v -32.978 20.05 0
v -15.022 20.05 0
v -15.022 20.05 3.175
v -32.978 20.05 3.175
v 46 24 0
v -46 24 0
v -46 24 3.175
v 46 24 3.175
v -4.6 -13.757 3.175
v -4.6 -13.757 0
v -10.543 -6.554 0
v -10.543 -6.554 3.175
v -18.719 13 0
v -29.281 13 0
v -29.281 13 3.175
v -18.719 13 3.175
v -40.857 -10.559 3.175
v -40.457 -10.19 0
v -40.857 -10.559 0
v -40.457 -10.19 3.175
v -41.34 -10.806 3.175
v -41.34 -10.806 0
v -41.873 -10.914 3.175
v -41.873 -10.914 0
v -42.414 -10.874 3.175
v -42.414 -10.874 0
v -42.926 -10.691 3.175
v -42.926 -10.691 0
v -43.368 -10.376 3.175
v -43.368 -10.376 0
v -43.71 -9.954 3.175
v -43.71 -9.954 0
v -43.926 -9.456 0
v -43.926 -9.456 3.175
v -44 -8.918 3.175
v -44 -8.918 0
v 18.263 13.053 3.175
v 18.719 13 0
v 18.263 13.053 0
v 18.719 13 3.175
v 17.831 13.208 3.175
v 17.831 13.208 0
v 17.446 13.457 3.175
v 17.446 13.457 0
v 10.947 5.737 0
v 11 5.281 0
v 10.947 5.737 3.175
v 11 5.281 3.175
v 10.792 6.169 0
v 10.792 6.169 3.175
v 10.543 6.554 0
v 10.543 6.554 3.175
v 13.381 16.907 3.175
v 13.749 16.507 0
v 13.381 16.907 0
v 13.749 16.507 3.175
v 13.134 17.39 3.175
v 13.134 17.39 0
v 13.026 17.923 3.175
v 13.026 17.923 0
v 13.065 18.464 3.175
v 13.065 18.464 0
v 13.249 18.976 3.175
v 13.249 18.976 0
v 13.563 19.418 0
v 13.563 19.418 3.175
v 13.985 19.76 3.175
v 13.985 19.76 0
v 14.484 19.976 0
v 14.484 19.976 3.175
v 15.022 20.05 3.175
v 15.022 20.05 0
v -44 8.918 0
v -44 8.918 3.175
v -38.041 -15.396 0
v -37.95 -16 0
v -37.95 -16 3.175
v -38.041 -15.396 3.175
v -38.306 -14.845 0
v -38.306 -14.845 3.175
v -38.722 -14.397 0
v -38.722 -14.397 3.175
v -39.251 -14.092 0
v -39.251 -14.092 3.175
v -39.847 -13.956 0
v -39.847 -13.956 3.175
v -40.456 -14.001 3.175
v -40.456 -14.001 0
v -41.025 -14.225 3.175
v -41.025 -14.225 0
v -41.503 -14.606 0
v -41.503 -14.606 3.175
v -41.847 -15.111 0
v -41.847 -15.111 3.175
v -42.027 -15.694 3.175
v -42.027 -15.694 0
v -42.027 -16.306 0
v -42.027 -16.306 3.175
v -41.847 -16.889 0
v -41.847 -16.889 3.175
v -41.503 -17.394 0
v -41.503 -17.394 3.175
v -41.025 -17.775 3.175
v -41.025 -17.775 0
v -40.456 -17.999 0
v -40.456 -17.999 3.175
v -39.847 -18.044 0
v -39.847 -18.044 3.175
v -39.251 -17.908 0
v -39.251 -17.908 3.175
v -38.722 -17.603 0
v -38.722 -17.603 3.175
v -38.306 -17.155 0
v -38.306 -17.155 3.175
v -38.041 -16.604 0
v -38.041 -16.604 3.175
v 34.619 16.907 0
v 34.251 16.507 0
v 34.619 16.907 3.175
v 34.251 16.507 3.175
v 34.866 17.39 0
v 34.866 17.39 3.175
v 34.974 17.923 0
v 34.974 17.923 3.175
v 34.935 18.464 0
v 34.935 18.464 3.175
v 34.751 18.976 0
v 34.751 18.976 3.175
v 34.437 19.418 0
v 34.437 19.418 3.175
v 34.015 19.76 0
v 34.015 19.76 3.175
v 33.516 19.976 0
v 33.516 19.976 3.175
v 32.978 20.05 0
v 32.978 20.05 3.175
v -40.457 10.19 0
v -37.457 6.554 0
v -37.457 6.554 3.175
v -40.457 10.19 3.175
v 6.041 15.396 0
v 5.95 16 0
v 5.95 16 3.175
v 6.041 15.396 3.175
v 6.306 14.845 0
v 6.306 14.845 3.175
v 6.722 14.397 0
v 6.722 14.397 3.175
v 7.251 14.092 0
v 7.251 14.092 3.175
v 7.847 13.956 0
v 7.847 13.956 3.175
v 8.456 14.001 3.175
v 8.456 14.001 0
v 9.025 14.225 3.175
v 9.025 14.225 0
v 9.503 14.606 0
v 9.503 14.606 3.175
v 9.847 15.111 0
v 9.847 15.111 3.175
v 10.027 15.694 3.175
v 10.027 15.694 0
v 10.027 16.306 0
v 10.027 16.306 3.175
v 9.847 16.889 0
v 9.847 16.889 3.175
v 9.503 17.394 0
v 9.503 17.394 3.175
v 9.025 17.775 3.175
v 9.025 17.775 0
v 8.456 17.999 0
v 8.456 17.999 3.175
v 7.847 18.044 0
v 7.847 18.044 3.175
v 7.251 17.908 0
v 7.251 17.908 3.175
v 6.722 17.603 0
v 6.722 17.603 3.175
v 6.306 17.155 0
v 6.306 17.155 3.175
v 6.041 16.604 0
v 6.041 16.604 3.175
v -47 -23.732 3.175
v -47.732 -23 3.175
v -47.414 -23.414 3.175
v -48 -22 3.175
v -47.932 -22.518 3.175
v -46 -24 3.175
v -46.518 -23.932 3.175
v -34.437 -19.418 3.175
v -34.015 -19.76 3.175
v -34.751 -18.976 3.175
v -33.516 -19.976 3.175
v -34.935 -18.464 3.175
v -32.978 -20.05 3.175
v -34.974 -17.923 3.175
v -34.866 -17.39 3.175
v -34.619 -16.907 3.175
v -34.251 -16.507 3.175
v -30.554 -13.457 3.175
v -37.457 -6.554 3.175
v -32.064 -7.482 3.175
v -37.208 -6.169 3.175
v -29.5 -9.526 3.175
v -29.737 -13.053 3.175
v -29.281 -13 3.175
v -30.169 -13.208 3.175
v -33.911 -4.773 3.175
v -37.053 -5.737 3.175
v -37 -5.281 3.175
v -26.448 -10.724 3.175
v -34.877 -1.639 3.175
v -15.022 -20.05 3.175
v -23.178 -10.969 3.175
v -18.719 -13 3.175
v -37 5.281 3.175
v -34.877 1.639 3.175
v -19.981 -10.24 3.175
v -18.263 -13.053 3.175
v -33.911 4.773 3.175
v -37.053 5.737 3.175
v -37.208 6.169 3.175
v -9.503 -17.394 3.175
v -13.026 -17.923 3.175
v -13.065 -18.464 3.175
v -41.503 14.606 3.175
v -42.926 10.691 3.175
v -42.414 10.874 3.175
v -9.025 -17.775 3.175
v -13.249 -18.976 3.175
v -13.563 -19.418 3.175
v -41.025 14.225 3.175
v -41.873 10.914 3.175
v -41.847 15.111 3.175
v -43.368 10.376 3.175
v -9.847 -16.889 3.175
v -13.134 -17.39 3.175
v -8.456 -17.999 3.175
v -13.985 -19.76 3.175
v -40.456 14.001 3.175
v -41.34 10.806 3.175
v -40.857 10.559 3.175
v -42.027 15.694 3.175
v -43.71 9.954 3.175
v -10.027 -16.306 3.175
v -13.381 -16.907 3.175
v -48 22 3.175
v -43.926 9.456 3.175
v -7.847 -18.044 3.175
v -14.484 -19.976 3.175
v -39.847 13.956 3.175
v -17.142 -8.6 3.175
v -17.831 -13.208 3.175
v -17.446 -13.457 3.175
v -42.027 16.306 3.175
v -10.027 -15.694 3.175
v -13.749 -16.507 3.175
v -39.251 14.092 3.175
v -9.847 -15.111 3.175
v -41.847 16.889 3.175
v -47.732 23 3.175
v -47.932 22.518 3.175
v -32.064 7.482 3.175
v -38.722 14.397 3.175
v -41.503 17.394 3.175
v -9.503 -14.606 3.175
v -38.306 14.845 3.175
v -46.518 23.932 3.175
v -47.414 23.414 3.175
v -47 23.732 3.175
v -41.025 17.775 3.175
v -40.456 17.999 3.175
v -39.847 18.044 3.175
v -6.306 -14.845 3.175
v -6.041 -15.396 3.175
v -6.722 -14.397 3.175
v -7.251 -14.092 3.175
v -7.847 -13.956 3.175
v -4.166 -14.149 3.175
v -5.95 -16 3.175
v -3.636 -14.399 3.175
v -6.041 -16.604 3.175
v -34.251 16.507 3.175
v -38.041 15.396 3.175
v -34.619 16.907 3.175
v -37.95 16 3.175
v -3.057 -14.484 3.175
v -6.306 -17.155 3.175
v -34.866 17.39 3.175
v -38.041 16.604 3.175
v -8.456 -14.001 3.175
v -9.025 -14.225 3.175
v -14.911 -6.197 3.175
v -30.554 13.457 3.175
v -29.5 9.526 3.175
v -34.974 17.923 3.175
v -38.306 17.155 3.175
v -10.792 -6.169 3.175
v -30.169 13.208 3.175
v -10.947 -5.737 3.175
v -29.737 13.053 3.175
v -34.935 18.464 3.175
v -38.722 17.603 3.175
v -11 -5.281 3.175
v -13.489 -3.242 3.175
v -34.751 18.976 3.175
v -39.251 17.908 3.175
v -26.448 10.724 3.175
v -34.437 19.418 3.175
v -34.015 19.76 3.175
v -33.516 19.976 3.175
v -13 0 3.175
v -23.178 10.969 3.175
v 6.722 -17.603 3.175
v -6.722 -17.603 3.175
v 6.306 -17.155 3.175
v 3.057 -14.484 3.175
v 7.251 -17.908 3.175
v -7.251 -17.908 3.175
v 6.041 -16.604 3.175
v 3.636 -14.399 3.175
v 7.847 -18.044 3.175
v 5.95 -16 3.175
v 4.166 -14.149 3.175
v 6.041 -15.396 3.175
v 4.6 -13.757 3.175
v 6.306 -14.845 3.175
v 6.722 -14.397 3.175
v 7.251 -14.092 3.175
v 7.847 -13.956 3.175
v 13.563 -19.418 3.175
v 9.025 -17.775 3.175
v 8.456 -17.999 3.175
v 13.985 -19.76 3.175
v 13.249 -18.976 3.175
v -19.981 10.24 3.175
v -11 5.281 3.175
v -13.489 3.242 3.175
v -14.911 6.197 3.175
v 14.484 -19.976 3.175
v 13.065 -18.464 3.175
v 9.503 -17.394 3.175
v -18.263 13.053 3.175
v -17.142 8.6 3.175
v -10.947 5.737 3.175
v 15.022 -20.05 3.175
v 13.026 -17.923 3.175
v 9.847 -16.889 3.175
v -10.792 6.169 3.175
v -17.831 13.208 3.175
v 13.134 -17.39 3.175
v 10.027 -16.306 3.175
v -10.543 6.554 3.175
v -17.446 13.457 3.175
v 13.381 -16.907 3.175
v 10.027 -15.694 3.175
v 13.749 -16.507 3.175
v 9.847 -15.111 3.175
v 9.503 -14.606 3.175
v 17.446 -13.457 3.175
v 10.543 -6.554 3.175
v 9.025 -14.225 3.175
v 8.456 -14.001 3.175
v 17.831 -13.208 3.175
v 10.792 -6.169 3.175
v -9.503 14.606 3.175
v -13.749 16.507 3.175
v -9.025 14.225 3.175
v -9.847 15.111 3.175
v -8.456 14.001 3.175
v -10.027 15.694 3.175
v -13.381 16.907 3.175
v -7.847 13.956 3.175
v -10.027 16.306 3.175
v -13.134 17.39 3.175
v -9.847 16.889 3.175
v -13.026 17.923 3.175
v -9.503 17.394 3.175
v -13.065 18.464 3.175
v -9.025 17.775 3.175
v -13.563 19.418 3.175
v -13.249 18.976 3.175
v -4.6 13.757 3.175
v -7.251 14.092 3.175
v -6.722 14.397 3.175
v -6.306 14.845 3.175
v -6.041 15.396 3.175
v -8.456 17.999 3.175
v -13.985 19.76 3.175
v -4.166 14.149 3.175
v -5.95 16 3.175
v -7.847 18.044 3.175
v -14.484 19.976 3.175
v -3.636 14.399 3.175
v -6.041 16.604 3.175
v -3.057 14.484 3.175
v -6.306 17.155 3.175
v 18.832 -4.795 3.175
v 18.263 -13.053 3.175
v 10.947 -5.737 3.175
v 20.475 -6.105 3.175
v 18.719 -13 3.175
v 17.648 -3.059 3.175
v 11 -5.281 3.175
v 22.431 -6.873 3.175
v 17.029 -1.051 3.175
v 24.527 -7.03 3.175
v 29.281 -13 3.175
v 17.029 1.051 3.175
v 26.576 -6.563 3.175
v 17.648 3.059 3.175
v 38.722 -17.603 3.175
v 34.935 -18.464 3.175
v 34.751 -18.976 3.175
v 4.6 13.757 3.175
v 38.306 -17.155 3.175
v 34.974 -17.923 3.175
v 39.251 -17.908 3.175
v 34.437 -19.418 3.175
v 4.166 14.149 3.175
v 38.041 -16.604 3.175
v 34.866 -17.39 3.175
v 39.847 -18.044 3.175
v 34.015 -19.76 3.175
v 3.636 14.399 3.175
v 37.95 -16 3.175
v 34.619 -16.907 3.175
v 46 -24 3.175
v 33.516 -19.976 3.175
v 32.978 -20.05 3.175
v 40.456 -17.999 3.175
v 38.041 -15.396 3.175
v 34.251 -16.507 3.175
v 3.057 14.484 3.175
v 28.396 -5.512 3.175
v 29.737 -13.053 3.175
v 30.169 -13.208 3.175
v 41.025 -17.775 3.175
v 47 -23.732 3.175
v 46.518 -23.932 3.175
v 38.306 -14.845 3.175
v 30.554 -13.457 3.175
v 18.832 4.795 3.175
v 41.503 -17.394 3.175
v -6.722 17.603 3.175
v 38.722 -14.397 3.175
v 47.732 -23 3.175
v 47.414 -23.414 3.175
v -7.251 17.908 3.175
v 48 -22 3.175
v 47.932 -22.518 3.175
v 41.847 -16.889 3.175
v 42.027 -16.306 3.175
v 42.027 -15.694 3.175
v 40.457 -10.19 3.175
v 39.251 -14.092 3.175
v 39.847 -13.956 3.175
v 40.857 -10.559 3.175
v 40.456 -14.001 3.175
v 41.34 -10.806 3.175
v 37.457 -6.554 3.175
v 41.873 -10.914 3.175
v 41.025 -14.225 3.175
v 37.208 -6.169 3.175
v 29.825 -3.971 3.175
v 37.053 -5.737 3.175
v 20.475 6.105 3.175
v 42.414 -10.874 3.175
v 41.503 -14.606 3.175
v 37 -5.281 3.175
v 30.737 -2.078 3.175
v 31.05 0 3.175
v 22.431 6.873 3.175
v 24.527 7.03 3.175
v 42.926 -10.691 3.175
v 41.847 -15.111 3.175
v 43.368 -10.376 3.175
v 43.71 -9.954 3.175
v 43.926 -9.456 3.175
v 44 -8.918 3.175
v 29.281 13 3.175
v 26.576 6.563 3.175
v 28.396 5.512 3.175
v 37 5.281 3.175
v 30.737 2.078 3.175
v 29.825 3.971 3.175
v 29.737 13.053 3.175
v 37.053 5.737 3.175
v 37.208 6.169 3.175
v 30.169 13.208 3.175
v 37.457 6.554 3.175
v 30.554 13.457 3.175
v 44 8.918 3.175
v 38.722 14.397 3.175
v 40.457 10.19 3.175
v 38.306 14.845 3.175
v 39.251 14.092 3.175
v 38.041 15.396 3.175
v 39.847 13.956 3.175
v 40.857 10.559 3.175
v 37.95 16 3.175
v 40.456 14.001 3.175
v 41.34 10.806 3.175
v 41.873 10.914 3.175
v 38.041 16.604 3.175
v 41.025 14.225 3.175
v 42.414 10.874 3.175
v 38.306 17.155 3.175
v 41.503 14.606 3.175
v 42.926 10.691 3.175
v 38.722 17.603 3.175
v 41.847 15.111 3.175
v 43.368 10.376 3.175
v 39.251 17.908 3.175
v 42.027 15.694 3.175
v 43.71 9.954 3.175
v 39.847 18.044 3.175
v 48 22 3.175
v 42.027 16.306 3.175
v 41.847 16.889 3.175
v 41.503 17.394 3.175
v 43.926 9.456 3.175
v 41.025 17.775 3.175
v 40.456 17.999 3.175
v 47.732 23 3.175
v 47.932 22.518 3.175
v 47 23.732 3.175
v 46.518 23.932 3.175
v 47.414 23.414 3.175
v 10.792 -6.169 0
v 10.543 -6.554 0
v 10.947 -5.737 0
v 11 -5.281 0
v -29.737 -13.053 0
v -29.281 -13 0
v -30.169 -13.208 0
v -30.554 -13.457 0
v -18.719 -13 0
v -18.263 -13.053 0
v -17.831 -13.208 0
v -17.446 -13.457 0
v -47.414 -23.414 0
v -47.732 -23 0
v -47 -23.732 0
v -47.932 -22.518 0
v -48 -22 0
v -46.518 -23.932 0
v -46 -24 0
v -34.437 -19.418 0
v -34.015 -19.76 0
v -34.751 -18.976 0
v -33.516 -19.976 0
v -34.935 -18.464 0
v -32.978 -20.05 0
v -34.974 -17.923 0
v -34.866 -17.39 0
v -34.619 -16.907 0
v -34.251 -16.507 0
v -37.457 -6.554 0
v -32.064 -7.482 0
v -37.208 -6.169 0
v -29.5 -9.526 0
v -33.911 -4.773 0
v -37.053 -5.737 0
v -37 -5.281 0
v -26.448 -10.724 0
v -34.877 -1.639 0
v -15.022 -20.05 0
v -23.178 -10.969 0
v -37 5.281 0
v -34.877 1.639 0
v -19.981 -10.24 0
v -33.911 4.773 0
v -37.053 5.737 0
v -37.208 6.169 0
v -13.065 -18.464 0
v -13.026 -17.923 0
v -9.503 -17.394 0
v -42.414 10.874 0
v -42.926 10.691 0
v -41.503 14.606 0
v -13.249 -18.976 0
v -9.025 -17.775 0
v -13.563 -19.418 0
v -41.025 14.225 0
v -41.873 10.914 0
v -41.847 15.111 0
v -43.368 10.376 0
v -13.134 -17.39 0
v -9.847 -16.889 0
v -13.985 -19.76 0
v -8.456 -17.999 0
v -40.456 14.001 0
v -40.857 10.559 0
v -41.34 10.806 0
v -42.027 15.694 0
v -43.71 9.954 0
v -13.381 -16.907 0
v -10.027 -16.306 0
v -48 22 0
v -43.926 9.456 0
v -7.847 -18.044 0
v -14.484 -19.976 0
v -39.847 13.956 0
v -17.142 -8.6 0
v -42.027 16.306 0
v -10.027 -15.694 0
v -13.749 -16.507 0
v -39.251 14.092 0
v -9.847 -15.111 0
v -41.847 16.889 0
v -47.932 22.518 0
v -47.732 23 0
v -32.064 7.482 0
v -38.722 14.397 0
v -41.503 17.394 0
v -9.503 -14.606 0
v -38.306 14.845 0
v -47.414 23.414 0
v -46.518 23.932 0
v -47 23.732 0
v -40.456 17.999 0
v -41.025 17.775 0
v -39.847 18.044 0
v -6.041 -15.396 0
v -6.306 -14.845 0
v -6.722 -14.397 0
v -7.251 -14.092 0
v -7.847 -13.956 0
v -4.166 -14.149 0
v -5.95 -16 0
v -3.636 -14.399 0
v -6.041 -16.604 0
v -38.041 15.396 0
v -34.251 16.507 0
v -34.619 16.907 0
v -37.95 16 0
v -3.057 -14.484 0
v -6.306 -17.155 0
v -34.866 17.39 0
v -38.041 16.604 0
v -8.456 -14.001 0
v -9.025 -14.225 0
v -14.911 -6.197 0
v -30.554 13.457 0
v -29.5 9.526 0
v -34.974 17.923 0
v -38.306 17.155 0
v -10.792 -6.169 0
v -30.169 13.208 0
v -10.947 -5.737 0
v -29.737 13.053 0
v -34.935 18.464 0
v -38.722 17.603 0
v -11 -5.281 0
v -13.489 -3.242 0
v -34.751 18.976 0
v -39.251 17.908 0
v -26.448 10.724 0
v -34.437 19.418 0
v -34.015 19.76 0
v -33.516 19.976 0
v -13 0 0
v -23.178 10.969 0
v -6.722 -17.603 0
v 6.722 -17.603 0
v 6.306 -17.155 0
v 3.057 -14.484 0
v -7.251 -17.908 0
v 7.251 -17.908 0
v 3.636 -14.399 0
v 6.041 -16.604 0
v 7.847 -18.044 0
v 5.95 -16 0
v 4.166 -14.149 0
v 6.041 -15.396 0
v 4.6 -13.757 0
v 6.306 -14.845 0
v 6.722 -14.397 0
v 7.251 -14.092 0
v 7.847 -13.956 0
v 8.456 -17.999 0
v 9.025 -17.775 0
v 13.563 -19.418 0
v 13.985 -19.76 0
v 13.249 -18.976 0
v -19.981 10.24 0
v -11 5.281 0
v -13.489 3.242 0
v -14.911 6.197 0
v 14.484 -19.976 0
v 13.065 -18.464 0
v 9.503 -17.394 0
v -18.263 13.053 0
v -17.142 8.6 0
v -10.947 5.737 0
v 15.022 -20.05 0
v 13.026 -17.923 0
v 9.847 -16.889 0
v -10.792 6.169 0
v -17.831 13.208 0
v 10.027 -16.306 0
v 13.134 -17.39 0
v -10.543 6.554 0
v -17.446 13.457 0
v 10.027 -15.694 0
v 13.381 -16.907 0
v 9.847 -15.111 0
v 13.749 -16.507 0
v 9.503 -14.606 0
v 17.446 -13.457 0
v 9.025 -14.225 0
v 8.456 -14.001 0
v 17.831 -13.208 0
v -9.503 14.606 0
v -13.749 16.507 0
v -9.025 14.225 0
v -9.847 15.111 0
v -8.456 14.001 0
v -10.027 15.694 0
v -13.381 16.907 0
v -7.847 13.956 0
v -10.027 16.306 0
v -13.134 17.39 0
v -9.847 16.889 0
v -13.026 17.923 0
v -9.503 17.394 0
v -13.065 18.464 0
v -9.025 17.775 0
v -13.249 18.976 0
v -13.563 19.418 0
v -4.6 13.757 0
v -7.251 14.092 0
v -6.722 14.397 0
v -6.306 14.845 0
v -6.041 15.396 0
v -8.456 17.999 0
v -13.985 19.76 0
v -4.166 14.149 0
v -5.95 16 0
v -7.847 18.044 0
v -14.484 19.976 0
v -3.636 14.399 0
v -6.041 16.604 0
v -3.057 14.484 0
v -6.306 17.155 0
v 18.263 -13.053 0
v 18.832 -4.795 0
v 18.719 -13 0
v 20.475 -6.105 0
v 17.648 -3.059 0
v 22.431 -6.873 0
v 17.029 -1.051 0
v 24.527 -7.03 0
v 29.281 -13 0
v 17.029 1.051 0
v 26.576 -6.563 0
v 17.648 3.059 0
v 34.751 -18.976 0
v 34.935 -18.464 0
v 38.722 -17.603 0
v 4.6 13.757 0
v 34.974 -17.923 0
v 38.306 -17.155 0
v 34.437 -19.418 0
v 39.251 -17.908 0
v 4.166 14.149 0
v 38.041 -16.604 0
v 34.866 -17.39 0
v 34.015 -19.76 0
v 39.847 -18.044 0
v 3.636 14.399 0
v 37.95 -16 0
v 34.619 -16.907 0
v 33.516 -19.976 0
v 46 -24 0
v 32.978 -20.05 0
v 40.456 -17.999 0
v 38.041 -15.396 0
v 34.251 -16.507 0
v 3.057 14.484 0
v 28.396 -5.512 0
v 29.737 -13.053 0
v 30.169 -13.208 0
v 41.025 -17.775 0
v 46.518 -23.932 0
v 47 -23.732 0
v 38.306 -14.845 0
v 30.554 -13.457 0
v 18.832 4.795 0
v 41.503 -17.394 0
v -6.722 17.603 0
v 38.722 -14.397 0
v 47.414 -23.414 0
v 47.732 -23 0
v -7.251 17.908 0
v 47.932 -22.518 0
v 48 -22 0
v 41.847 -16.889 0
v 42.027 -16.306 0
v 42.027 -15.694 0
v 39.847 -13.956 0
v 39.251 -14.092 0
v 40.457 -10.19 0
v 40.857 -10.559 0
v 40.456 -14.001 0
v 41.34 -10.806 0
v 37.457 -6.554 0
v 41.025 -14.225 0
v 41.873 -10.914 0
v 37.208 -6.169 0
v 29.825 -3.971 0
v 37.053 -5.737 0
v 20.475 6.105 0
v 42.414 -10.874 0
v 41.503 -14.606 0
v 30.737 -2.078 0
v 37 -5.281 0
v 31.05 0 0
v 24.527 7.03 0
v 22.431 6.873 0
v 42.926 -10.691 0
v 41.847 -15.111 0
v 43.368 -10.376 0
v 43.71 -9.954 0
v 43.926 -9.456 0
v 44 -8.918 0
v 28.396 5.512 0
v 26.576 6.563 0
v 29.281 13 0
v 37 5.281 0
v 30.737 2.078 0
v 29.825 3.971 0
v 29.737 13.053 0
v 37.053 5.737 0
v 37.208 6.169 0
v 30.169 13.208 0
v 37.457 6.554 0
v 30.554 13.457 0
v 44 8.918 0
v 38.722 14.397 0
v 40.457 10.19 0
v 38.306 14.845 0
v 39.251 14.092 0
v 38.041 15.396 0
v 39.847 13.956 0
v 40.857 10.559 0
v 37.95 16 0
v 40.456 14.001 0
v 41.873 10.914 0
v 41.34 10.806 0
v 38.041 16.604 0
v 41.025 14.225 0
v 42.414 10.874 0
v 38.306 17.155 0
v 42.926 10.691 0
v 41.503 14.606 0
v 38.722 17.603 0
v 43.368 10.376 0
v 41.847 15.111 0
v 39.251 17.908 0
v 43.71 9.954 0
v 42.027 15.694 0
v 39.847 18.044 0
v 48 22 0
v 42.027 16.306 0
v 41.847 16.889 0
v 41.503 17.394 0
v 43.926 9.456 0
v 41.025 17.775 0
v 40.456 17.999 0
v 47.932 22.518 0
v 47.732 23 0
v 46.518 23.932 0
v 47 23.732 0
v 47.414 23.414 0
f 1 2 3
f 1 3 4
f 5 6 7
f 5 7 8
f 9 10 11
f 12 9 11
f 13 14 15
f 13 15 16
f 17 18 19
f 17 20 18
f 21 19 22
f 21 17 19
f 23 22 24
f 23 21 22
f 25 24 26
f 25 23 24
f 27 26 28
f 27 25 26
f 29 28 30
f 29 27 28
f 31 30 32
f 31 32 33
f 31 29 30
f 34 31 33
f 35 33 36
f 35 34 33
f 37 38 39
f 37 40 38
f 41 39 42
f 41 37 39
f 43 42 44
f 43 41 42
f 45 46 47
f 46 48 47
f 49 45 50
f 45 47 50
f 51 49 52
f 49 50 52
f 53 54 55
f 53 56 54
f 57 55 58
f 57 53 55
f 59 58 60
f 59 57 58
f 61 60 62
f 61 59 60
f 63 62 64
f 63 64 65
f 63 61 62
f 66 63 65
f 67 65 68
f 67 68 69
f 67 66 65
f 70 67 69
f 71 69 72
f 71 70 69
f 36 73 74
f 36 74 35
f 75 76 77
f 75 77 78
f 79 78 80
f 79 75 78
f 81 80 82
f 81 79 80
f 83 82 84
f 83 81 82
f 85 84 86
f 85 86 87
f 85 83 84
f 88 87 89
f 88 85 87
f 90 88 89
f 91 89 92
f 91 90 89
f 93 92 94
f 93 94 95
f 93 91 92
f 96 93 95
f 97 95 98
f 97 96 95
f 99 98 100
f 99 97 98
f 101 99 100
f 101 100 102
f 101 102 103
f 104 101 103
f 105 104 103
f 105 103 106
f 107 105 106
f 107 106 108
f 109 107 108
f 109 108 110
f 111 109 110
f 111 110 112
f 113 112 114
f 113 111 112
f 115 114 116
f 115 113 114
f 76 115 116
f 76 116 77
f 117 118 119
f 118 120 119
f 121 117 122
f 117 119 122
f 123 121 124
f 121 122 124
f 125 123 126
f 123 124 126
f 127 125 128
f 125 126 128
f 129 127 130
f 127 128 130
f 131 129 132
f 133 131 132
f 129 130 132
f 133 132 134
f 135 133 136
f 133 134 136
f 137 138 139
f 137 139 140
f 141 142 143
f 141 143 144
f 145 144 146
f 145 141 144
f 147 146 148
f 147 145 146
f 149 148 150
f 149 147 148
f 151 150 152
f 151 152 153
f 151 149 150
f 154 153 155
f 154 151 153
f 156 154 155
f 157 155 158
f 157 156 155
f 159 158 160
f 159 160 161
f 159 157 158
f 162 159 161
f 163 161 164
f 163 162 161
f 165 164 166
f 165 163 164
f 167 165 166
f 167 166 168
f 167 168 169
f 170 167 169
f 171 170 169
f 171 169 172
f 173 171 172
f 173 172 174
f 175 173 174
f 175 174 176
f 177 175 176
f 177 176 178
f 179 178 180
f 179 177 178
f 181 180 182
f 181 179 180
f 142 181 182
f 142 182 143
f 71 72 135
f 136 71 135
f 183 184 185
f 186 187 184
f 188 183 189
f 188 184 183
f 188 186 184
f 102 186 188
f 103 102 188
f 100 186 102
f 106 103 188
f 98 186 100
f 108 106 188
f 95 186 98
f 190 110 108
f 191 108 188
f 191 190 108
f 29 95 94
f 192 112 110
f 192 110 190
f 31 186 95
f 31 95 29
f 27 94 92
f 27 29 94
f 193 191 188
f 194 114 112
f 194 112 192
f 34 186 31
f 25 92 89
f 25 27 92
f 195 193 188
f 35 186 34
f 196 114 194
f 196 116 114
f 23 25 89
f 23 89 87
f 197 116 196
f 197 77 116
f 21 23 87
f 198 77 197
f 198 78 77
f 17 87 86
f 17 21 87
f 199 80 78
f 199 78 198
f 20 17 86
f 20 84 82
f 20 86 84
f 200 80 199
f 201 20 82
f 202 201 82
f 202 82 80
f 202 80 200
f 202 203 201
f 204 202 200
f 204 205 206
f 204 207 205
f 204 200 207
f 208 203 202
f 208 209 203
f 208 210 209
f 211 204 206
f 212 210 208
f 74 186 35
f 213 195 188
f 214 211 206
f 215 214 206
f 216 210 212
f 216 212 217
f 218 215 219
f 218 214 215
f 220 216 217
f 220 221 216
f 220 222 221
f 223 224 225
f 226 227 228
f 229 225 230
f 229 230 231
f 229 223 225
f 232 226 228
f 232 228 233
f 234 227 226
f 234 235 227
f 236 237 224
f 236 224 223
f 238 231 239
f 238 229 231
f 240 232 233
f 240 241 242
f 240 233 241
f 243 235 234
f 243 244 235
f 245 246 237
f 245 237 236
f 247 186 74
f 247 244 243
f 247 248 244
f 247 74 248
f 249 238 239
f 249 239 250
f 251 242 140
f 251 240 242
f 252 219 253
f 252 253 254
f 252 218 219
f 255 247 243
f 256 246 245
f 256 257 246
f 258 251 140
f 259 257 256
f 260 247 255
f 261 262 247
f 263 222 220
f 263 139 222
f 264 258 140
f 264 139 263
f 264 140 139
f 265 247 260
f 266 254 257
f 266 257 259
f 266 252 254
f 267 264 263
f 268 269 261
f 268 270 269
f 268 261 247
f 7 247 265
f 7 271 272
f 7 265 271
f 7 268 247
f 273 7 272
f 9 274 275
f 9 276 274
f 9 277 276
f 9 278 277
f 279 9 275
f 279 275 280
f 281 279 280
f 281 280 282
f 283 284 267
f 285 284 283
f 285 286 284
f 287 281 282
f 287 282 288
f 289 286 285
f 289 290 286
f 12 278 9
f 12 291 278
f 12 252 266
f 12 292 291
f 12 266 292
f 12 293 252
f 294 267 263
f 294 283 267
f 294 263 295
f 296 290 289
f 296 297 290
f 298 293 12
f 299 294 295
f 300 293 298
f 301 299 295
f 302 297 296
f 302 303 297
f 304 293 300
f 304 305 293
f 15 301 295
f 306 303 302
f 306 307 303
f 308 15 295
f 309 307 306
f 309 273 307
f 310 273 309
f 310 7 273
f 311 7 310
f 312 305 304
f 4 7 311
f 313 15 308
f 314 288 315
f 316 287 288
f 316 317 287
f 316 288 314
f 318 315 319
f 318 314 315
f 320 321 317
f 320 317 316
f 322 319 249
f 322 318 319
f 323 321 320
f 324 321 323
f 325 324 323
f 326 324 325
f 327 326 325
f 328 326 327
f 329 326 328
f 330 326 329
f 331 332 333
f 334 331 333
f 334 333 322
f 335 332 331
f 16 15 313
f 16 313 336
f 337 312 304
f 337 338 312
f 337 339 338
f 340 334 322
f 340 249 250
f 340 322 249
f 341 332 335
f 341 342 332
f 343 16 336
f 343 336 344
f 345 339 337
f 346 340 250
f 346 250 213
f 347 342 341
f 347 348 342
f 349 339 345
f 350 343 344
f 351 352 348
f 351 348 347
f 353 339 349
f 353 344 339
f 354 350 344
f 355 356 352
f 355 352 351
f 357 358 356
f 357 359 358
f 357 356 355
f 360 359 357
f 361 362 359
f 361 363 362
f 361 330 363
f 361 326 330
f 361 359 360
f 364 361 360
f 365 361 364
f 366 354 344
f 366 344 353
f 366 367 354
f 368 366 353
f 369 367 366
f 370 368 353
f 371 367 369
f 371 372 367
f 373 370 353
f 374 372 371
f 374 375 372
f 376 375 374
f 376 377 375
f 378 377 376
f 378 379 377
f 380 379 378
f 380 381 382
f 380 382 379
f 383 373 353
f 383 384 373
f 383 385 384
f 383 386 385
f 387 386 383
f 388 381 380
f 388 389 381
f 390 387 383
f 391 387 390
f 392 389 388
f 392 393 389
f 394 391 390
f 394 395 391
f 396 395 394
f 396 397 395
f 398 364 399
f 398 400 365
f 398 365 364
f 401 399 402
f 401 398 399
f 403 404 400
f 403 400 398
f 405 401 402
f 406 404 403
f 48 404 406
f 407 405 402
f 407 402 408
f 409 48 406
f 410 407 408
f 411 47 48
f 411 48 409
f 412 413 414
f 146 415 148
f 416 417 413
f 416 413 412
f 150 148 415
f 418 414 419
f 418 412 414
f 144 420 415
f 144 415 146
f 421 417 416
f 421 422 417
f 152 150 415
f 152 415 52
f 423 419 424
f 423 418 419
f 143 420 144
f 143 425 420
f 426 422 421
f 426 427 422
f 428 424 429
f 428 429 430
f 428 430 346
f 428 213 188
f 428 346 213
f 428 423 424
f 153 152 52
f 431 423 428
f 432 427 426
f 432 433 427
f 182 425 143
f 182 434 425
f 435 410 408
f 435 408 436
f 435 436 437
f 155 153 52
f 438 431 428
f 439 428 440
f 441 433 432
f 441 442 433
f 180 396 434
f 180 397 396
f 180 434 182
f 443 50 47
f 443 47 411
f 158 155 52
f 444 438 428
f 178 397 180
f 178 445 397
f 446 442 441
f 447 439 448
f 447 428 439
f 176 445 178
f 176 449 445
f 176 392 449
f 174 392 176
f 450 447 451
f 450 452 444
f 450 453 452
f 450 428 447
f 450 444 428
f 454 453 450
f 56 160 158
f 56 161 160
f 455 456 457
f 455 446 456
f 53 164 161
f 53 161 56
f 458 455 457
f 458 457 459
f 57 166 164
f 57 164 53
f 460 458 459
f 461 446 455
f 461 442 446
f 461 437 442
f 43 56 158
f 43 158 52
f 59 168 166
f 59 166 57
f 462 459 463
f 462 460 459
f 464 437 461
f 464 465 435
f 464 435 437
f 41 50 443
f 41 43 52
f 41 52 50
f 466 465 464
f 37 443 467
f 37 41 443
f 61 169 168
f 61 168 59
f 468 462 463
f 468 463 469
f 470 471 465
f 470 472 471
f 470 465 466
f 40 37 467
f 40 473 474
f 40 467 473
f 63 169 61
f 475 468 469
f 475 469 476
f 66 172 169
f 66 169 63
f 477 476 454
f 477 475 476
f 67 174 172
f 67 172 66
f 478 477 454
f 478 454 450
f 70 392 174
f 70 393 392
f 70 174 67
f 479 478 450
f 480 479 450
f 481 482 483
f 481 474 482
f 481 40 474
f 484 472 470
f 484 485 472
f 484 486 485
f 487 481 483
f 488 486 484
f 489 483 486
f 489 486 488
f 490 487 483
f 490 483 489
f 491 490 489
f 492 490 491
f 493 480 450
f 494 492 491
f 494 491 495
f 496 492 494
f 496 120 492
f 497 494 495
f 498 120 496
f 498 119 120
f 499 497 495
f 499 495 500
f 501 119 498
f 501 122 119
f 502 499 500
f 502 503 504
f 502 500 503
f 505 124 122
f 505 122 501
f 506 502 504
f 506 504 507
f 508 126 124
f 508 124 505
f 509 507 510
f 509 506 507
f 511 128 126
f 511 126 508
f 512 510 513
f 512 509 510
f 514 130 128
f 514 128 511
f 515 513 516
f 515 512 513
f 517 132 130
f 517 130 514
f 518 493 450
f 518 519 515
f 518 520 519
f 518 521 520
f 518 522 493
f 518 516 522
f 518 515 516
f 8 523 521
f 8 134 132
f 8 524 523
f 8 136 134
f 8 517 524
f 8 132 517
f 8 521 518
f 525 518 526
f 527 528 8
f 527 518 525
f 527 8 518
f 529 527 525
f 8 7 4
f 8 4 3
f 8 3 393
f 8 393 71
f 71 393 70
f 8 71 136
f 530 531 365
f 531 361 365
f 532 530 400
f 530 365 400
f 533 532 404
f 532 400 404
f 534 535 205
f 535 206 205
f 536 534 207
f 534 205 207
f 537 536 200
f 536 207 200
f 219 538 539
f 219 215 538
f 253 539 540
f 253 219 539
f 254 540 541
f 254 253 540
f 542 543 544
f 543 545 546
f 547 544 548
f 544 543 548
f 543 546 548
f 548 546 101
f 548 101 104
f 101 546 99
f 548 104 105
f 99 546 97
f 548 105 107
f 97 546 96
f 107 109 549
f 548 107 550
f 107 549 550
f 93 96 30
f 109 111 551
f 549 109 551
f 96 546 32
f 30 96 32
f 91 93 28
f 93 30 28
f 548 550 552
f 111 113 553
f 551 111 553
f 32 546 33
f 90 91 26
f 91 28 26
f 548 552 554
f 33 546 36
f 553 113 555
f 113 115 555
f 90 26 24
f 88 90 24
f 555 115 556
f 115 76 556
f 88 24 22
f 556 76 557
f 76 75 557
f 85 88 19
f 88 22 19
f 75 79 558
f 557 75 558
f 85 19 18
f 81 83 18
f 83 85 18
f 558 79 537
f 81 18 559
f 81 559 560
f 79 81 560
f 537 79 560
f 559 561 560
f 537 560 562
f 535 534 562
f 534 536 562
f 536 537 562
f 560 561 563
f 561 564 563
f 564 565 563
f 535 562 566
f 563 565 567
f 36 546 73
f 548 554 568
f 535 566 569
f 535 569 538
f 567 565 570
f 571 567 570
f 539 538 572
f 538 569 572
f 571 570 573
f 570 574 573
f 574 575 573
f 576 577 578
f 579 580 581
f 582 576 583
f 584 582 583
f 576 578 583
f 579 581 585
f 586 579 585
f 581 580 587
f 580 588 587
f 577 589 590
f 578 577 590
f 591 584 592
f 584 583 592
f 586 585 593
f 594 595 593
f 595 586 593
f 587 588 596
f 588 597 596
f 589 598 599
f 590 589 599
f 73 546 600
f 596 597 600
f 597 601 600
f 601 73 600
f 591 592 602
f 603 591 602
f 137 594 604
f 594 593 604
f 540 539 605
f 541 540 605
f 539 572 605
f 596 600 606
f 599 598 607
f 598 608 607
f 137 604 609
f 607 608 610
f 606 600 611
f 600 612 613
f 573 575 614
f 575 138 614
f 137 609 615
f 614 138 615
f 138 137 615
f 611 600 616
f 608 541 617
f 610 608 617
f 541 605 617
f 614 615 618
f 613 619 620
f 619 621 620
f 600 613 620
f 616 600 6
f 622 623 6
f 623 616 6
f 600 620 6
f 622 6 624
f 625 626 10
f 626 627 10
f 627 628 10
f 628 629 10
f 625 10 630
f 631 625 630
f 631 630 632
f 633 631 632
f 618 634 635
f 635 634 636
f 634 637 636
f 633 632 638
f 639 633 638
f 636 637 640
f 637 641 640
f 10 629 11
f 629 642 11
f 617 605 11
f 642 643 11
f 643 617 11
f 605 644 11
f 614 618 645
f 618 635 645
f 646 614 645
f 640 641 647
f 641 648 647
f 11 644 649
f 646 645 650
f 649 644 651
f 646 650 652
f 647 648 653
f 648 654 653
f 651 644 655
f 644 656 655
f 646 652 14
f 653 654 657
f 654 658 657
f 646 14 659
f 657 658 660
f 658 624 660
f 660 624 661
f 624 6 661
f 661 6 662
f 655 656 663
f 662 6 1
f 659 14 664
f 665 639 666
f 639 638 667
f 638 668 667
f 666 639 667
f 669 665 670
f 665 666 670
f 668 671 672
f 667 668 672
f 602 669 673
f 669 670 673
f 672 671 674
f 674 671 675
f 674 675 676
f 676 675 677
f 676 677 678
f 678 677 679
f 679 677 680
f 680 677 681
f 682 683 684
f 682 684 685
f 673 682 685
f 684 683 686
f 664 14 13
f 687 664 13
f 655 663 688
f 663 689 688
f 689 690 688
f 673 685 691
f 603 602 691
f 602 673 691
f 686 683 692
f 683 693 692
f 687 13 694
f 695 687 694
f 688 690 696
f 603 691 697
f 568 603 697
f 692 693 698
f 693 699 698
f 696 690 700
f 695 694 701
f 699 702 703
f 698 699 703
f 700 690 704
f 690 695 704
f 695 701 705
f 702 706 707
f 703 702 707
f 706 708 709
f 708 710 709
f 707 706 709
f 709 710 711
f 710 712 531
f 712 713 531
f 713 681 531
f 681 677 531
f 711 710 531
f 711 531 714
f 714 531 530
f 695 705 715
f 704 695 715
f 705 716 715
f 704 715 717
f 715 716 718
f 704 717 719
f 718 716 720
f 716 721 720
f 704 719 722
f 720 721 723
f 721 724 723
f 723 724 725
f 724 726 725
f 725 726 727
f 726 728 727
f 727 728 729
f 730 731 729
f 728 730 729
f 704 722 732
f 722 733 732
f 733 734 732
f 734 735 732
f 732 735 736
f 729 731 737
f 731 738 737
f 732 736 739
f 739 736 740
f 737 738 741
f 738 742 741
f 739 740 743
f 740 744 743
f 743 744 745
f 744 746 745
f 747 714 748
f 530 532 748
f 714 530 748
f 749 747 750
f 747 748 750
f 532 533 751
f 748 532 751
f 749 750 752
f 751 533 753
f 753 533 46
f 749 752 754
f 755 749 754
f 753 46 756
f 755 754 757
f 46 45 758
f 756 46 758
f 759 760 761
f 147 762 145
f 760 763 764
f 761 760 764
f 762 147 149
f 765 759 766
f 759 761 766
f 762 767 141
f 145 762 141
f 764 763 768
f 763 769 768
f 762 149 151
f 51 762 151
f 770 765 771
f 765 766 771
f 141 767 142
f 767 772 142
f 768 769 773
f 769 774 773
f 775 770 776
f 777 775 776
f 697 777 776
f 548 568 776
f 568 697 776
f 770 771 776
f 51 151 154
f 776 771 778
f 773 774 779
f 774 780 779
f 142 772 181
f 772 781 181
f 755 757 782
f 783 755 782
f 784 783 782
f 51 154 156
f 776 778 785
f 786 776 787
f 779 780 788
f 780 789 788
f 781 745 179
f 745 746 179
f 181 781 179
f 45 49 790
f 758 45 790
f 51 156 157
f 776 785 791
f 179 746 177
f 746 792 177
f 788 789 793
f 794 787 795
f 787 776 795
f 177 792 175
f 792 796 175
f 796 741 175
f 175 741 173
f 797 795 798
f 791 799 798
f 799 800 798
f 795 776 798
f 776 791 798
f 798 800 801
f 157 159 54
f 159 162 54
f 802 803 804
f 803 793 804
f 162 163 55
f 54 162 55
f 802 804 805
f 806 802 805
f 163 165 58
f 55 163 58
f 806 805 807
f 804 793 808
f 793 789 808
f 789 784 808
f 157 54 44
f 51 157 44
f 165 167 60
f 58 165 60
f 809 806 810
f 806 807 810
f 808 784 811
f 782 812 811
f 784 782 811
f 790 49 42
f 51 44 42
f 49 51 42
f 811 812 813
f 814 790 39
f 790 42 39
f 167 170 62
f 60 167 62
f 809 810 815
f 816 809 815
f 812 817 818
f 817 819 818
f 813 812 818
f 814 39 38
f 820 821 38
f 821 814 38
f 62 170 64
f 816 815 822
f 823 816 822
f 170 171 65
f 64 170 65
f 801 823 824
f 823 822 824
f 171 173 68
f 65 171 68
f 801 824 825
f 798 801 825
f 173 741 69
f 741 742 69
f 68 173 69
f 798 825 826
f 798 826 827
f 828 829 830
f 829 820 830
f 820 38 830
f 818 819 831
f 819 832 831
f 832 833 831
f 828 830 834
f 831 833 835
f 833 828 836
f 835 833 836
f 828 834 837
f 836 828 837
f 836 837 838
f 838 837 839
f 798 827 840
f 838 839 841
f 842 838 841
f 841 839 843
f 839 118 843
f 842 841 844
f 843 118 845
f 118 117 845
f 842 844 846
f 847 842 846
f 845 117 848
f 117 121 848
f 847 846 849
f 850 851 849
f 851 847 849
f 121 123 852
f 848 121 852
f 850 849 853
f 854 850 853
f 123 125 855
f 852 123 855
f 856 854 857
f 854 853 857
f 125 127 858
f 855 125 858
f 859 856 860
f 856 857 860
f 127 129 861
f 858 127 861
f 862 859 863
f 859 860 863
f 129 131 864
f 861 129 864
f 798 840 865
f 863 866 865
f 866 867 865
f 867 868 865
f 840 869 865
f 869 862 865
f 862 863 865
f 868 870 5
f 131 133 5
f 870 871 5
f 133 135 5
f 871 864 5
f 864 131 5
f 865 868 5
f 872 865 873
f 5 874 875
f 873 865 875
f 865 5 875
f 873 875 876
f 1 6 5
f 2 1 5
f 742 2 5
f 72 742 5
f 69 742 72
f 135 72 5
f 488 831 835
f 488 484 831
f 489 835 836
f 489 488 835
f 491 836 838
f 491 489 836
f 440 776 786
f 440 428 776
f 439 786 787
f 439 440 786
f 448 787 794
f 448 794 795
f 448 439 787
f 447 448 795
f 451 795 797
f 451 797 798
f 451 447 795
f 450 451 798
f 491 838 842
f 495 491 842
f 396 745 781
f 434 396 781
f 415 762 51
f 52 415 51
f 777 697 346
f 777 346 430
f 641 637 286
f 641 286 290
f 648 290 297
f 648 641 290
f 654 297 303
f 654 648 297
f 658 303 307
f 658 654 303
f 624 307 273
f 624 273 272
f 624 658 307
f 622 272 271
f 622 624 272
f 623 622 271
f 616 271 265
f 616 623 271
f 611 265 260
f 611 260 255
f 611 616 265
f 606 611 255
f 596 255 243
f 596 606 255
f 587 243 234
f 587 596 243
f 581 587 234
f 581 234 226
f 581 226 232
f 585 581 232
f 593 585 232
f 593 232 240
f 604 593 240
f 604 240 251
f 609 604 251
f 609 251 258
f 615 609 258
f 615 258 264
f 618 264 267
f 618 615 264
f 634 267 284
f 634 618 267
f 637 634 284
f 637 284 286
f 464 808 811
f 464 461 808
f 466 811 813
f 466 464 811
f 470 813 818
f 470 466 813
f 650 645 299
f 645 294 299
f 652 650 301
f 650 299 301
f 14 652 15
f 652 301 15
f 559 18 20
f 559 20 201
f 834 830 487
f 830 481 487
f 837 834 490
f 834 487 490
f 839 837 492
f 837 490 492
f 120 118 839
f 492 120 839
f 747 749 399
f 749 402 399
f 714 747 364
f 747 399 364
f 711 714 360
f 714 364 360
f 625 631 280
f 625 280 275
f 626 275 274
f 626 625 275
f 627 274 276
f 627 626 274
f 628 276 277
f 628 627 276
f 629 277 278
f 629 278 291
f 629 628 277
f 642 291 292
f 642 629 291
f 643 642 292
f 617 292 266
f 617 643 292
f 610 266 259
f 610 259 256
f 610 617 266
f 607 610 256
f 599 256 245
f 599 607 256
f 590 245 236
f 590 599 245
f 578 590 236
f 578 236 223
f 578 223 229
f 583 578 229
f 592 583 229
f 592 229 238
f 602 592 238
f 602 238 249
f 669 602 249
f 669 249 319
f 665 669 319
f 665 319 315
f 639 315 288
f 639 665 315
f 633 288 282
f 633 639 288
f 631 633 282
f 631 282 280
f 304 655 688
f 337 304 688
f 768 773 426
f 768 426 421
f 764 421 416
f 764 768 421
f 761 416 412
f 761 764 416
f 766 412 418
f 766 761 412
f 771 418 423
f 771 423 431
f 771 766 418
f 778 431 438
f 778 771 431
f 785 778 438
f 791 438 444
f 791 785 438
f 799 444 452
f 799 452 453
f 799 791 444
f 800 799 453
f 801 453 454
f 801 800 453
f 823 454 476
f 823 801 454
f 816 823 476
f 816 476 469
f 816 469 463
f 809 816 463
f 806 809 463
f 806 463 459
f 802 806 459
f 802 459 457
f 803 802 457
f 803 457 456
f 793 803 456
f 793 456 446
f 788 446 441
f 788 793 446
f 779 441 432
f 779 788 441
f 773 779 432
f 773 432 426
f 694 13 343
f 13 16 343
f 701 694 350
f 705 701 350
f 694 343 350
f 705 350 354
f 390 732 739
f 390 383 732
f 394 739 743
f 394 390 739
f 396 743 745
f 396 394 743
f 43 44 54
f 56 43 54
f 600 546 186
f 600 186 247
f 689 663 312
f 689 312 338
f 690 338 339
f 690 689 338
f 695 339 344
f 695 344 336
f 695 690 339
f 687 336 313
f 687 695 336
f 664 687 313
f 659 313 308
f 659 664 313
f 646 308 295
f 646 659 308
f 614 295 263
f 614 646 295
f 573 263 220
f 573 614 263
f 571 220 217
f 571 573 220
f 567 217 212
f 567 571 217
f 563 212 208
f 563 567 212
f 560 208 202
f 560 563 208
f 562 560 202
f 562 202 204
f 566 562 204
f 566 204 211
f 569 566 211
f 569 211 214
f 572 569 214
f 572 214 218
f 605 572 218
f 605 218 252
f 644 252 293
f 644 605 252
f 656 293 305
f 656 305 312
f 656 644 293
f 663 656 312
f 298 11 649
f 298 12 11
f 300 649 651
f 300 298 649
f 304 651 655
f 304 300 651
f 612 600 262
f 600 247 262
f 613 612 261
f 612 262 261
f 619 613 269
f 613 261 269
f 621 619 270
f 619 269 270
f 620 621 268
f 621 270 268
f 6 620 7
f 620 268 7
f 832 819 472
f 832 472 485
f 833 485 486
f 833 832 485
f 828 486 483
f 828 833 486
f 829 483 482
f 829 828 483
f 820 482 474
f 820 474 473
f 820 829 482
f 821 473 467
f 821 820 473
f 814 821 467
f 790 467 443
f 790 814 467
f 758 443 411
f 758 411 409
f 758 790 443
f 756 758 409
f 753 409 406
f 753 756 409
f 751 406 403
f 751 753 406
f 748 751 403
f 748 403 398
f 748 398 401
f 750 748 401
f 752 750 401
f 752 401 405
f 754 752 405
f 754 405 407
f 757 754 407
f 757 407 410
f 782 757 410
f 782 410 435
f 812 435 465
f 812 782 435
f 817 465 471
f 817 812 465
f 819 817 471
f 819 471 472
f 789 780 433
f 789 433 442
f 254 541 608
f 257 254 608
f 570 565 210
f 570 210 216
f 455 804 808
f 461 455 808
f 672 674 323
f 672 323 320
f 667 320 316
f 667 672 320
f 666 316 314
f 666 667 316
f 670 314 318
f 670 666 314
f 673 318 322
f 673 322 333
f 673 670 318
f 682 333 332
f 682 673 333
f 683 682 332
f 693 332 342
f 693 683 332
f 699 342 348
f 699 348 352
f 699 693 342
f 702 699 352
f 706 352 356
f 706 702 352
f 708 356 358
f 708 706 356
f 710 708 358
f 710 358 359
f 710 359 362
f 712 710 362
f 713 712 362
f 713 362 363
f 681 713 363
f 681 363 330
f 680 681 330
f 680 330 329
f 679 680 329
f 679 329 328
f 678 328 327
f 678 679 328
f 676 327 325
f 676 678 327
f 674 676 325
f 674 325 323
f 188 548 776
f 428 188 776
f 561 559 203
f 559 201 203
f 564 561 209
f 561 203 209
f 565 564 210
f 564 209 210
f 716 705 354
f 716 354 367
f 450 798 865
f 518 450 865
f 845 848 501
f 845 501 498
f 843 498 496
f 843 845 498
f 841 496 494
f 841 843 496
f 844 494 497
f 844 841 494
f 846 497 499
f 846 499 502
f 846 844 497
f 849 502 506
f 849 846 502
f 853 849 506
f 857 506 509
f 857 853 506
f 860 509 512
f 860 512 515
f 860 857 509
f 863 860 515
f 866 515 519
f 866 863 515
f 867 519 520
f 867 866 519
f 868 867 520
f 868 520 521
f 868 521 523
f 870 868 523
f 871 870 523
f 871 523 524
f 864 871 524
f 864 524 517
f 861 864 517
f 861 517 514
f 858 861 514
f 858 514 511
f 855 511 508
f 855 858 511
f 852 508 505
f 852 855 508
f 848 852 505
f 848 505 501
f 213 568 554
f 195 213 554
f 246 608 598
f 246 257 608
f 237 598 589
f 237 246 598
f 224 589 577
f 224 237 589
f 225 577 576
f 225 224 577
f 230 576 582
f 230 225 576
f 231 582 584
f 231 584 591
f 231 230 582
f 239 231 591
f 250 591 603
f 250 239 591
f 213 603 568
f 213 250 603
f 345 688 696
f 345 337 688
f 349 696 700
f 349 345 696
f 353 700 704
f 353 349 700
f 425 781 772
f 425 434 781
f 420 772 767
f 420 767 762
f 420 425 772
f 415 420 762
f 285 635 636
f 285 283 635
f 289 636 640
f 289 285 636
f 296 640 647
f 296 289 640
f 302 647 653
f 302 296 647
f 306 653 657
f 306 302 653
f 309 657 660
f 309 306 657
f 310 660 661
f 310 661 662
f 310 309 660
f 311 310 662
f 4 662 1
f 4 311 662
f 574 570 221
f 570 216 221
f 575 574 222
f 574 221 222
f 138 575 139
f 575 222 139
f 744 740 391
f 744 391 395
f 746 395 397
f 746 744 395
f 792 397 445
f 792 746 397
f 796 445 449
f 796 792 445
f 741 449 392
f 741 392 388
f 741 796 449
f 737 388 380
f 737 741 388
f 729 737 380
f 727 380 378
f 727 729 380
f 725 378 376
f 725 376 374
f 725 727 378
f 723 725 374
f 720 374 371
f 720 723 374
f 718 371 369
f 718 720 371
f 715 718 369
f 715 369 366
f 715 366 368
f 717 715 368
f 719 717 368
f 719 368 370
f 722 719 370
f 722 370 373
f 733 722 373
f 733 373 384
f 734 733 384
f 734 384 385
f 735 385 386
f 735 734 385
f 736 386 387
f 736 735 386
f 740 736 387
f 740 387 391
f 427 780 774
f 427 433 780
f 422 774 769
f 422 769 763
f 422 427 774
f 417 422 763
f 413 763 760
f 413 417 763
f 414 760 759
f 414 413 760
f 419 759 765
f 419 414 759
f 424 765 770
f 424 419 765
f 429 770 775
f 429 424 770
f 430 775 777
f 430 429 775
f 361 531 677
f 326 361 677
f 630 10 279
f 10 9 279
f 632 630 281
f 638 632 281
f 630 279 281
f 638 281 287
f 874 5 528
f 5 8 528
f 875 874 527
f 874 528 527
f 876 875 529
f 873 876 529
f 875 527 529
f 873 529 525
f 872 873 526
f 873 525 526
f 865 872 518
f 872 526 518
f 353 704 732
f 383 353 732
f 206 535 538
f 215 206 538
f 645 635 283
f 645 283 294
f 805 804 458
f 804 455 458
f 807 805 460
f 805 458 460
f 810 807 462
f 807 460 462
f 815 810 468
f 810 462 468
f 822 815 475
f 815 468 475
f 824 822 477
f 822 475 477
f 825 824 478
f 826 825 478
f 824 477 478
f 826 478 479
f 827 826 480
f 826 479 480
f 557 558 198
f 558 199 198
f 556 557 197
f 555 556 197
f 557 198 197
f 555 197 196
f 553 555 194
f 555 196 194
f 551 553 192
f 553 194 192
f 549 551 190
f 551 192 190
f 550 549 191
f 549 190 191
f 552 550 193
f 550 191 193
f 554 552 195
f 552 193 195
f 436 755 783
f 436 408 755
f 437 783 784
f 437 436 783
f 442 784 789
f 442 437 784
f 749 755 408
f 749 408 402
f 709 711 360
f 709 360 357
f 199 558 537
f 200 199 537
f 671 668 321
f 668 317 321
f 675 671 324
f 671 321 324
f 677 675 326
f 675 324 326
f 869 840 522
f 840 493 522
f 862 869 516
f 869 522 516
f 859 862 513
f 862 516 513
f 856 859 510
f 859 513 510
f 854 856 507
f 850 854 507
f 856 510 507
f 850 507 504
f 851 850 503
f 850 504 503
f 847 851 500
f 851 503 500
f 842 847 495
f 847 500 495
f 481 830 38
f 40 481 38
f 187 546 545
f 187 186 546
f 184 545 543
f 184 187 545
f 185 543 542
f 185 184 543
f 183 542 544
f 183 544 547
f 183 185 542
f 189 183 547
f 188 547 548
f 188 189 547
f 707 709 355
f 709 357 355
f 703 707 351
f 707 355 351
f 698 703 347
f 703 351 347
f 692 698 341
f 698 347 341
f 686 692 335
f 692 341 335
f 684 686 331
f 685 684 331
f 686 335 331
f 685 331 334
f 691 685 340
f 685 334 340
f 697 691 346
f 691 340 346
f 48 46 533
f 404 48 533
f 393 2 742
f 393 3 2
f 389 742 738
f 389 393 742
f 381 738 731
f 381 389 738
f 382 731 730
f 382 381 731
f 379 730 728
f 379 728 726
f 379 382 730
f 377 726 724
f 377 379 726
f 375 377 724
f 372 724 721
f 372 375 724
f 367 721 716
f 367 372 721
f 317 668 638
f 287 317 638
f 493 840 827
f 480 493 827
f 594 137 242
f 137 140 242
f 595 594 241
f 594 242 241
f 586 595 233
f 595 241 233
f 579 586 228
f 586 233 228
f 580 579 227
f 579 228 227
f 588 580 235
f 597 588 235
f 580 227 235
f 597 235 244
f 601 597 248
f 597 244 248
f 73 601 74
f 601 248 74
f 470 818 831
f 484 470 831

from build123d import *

# Parameters (mm, degrees)
SKETCH1_W           = 96
SKETCH1_H           = 48
SKETCH1_R           = 2.05
SKETCH1_R_2         = 11
SKETCH1_R_3         = 7.05
BOSS_EXTRUDE1_DEPTH = 3.175
FILLET1_R           = 2


with BuildPart() as part:
    # Sketch1 → Boss-Extrude1 (new body)
    with BuildSketch(Plane.XY):
        Rectangle(SKETCH1_W, SKETCH1_H)
        with Locations((-40, 16)):
            Circle(SKETCH1_R, mode=Mode.SUBTRACT)
        with Locations((-8, 16)):
            Circle(SKETCH1_R, mode=Mode.SUBTRACT)
        with Locations((-8, -16)):
            Circle(SKETCH1_R, mode=Mode.SUBTRACT)
        with Locations((-40, -16)):
            Circle(SKETCH1_R, mode=Mode.SUBTRACT)
        with Locations((-24, 0)):
            Circle(SKETCH1_R_2, mode=Mode.SUBTRACT)
        with Locations(Location((8, 16, 0), (0, 0, 180))):
            Circle(SKETCH1_R, mode=Mode.SUBTRACT)
        with Locations(Location((8, -16, 0), (0, 0, 180))):
            Circle(SKETCH1_R, mode=Mode.SUBTRACT)
        with Locations(Location((40, -16, 0), (0, 0, 180))):
            Circle(SKETCH1_R, mode=Mode.SUBTRACT)
        with Locations(Location((40, 16, 0), (0, 0, 180))):
            Circle(SKETCH1_R, mode=Mode.SUBTRACT)
        with Locations((24, 0)):
            Circle(SKETCH1_R_3, mode=Mode.SUBTRACT)
        Polygon((-38.544929421, 20.05), (-30, 13), (-18, 13), (-9.455070579, 20.05), align=None, mode=Mode.SUBTRACT)
        Polygon((-18, -13), (-9.455070579, -20.05), (-38.544929421, -20.05), (-30, -13), align=None, mode=Mode.SUBTRACT)
        Polygon((-11, -6), (-11, 6), (-4, 14.484327085), (4, 14.484327085), (11, 6), (11, -6), (4, -14.484327085), (-4, -14.484327085), align=None, mode=Mode.SUBTRACT)
        Polygon((30, -13), (18, -13), (9.455070579, -20.05), (38.544929421, -20.05), align=None, mode=Mode.SUBTRACT)
        Polygon((37, -6), (37, 6), (44, 14.484327085), (44, -14.484327085), align=None, mode=Mode.SUBTRACT)
        Polygon((18, 13), (9.455070579, 20.05), (38.544929421, 20.05), (30, 13), align=None, mode=Mode.SUBTRACT)
        Polygon((-44, -14.484327085), (-37, -6), (-37, 6), (-44, 14.484327085), align=None, mode=Mode.SUBTRACT)
    extrude(amount=BOSS_EXTRUDE1_DEPTH)

    # Fillet1
    fillet1_edges = [part.edges().sort_by_distance(p)[0] for p in [
        (38.544929421, -20.05, 1.5875),
        (30, -13, 1.5875),
        (18, -13, 1.5875),
        (9.455070579, -20.05, 1.5875),
        (37, -6, 1.5875),
        (44, -14.484327085, 1.5875),
        (44, 14.484327085, 1.5875),
        (37, 6, 1.5875),
        (18, 13, 1.5875),
        (30, 13, 1.5875),
        (38.544929421, 20.05, 1.5875),
        (9.455070579, 20.05, 1.5875),
        (-9.455070579, 20.05, 1.5875),
        (-38.544929421, 20.05, 1.5875),
        (-30, 13, 1.5875),
        (-18, 13, 1.5875),
        (-11, -6, 1.5875),
        (-4, -14.484327085, 1.5875),
        (4, -14.484327085, 1.5875),
        (11, -6, 1.5875),
        (11, 6, 1.5875),
        (4, 14.484327085, 1.5875),
        (-4, 14.484327085, 1.5875),
        (-11, 6, 1.5875),
        (-37, -6, 1.5875),
        (-37, 6, 1.5875),
        (-44, 14.484327085, 1.5875),
        (-44, -14.484327085, 1.5875),
        (-48, 24, 1.5875),
        (48, 24, 1.5875),
        (48, -24, 1.5875),
        (-48, -24, 1.5875),
        (-18, -13, 1.5875),
        (-30, -13, 1.5875),
        (-38.544929421, -20.05, 1.5875),
        (-9.455070579, -20.05, 1.5875),
    ]]
    fillet(fillet1_edges, radius=FILLET1_R)


solid = part.part
